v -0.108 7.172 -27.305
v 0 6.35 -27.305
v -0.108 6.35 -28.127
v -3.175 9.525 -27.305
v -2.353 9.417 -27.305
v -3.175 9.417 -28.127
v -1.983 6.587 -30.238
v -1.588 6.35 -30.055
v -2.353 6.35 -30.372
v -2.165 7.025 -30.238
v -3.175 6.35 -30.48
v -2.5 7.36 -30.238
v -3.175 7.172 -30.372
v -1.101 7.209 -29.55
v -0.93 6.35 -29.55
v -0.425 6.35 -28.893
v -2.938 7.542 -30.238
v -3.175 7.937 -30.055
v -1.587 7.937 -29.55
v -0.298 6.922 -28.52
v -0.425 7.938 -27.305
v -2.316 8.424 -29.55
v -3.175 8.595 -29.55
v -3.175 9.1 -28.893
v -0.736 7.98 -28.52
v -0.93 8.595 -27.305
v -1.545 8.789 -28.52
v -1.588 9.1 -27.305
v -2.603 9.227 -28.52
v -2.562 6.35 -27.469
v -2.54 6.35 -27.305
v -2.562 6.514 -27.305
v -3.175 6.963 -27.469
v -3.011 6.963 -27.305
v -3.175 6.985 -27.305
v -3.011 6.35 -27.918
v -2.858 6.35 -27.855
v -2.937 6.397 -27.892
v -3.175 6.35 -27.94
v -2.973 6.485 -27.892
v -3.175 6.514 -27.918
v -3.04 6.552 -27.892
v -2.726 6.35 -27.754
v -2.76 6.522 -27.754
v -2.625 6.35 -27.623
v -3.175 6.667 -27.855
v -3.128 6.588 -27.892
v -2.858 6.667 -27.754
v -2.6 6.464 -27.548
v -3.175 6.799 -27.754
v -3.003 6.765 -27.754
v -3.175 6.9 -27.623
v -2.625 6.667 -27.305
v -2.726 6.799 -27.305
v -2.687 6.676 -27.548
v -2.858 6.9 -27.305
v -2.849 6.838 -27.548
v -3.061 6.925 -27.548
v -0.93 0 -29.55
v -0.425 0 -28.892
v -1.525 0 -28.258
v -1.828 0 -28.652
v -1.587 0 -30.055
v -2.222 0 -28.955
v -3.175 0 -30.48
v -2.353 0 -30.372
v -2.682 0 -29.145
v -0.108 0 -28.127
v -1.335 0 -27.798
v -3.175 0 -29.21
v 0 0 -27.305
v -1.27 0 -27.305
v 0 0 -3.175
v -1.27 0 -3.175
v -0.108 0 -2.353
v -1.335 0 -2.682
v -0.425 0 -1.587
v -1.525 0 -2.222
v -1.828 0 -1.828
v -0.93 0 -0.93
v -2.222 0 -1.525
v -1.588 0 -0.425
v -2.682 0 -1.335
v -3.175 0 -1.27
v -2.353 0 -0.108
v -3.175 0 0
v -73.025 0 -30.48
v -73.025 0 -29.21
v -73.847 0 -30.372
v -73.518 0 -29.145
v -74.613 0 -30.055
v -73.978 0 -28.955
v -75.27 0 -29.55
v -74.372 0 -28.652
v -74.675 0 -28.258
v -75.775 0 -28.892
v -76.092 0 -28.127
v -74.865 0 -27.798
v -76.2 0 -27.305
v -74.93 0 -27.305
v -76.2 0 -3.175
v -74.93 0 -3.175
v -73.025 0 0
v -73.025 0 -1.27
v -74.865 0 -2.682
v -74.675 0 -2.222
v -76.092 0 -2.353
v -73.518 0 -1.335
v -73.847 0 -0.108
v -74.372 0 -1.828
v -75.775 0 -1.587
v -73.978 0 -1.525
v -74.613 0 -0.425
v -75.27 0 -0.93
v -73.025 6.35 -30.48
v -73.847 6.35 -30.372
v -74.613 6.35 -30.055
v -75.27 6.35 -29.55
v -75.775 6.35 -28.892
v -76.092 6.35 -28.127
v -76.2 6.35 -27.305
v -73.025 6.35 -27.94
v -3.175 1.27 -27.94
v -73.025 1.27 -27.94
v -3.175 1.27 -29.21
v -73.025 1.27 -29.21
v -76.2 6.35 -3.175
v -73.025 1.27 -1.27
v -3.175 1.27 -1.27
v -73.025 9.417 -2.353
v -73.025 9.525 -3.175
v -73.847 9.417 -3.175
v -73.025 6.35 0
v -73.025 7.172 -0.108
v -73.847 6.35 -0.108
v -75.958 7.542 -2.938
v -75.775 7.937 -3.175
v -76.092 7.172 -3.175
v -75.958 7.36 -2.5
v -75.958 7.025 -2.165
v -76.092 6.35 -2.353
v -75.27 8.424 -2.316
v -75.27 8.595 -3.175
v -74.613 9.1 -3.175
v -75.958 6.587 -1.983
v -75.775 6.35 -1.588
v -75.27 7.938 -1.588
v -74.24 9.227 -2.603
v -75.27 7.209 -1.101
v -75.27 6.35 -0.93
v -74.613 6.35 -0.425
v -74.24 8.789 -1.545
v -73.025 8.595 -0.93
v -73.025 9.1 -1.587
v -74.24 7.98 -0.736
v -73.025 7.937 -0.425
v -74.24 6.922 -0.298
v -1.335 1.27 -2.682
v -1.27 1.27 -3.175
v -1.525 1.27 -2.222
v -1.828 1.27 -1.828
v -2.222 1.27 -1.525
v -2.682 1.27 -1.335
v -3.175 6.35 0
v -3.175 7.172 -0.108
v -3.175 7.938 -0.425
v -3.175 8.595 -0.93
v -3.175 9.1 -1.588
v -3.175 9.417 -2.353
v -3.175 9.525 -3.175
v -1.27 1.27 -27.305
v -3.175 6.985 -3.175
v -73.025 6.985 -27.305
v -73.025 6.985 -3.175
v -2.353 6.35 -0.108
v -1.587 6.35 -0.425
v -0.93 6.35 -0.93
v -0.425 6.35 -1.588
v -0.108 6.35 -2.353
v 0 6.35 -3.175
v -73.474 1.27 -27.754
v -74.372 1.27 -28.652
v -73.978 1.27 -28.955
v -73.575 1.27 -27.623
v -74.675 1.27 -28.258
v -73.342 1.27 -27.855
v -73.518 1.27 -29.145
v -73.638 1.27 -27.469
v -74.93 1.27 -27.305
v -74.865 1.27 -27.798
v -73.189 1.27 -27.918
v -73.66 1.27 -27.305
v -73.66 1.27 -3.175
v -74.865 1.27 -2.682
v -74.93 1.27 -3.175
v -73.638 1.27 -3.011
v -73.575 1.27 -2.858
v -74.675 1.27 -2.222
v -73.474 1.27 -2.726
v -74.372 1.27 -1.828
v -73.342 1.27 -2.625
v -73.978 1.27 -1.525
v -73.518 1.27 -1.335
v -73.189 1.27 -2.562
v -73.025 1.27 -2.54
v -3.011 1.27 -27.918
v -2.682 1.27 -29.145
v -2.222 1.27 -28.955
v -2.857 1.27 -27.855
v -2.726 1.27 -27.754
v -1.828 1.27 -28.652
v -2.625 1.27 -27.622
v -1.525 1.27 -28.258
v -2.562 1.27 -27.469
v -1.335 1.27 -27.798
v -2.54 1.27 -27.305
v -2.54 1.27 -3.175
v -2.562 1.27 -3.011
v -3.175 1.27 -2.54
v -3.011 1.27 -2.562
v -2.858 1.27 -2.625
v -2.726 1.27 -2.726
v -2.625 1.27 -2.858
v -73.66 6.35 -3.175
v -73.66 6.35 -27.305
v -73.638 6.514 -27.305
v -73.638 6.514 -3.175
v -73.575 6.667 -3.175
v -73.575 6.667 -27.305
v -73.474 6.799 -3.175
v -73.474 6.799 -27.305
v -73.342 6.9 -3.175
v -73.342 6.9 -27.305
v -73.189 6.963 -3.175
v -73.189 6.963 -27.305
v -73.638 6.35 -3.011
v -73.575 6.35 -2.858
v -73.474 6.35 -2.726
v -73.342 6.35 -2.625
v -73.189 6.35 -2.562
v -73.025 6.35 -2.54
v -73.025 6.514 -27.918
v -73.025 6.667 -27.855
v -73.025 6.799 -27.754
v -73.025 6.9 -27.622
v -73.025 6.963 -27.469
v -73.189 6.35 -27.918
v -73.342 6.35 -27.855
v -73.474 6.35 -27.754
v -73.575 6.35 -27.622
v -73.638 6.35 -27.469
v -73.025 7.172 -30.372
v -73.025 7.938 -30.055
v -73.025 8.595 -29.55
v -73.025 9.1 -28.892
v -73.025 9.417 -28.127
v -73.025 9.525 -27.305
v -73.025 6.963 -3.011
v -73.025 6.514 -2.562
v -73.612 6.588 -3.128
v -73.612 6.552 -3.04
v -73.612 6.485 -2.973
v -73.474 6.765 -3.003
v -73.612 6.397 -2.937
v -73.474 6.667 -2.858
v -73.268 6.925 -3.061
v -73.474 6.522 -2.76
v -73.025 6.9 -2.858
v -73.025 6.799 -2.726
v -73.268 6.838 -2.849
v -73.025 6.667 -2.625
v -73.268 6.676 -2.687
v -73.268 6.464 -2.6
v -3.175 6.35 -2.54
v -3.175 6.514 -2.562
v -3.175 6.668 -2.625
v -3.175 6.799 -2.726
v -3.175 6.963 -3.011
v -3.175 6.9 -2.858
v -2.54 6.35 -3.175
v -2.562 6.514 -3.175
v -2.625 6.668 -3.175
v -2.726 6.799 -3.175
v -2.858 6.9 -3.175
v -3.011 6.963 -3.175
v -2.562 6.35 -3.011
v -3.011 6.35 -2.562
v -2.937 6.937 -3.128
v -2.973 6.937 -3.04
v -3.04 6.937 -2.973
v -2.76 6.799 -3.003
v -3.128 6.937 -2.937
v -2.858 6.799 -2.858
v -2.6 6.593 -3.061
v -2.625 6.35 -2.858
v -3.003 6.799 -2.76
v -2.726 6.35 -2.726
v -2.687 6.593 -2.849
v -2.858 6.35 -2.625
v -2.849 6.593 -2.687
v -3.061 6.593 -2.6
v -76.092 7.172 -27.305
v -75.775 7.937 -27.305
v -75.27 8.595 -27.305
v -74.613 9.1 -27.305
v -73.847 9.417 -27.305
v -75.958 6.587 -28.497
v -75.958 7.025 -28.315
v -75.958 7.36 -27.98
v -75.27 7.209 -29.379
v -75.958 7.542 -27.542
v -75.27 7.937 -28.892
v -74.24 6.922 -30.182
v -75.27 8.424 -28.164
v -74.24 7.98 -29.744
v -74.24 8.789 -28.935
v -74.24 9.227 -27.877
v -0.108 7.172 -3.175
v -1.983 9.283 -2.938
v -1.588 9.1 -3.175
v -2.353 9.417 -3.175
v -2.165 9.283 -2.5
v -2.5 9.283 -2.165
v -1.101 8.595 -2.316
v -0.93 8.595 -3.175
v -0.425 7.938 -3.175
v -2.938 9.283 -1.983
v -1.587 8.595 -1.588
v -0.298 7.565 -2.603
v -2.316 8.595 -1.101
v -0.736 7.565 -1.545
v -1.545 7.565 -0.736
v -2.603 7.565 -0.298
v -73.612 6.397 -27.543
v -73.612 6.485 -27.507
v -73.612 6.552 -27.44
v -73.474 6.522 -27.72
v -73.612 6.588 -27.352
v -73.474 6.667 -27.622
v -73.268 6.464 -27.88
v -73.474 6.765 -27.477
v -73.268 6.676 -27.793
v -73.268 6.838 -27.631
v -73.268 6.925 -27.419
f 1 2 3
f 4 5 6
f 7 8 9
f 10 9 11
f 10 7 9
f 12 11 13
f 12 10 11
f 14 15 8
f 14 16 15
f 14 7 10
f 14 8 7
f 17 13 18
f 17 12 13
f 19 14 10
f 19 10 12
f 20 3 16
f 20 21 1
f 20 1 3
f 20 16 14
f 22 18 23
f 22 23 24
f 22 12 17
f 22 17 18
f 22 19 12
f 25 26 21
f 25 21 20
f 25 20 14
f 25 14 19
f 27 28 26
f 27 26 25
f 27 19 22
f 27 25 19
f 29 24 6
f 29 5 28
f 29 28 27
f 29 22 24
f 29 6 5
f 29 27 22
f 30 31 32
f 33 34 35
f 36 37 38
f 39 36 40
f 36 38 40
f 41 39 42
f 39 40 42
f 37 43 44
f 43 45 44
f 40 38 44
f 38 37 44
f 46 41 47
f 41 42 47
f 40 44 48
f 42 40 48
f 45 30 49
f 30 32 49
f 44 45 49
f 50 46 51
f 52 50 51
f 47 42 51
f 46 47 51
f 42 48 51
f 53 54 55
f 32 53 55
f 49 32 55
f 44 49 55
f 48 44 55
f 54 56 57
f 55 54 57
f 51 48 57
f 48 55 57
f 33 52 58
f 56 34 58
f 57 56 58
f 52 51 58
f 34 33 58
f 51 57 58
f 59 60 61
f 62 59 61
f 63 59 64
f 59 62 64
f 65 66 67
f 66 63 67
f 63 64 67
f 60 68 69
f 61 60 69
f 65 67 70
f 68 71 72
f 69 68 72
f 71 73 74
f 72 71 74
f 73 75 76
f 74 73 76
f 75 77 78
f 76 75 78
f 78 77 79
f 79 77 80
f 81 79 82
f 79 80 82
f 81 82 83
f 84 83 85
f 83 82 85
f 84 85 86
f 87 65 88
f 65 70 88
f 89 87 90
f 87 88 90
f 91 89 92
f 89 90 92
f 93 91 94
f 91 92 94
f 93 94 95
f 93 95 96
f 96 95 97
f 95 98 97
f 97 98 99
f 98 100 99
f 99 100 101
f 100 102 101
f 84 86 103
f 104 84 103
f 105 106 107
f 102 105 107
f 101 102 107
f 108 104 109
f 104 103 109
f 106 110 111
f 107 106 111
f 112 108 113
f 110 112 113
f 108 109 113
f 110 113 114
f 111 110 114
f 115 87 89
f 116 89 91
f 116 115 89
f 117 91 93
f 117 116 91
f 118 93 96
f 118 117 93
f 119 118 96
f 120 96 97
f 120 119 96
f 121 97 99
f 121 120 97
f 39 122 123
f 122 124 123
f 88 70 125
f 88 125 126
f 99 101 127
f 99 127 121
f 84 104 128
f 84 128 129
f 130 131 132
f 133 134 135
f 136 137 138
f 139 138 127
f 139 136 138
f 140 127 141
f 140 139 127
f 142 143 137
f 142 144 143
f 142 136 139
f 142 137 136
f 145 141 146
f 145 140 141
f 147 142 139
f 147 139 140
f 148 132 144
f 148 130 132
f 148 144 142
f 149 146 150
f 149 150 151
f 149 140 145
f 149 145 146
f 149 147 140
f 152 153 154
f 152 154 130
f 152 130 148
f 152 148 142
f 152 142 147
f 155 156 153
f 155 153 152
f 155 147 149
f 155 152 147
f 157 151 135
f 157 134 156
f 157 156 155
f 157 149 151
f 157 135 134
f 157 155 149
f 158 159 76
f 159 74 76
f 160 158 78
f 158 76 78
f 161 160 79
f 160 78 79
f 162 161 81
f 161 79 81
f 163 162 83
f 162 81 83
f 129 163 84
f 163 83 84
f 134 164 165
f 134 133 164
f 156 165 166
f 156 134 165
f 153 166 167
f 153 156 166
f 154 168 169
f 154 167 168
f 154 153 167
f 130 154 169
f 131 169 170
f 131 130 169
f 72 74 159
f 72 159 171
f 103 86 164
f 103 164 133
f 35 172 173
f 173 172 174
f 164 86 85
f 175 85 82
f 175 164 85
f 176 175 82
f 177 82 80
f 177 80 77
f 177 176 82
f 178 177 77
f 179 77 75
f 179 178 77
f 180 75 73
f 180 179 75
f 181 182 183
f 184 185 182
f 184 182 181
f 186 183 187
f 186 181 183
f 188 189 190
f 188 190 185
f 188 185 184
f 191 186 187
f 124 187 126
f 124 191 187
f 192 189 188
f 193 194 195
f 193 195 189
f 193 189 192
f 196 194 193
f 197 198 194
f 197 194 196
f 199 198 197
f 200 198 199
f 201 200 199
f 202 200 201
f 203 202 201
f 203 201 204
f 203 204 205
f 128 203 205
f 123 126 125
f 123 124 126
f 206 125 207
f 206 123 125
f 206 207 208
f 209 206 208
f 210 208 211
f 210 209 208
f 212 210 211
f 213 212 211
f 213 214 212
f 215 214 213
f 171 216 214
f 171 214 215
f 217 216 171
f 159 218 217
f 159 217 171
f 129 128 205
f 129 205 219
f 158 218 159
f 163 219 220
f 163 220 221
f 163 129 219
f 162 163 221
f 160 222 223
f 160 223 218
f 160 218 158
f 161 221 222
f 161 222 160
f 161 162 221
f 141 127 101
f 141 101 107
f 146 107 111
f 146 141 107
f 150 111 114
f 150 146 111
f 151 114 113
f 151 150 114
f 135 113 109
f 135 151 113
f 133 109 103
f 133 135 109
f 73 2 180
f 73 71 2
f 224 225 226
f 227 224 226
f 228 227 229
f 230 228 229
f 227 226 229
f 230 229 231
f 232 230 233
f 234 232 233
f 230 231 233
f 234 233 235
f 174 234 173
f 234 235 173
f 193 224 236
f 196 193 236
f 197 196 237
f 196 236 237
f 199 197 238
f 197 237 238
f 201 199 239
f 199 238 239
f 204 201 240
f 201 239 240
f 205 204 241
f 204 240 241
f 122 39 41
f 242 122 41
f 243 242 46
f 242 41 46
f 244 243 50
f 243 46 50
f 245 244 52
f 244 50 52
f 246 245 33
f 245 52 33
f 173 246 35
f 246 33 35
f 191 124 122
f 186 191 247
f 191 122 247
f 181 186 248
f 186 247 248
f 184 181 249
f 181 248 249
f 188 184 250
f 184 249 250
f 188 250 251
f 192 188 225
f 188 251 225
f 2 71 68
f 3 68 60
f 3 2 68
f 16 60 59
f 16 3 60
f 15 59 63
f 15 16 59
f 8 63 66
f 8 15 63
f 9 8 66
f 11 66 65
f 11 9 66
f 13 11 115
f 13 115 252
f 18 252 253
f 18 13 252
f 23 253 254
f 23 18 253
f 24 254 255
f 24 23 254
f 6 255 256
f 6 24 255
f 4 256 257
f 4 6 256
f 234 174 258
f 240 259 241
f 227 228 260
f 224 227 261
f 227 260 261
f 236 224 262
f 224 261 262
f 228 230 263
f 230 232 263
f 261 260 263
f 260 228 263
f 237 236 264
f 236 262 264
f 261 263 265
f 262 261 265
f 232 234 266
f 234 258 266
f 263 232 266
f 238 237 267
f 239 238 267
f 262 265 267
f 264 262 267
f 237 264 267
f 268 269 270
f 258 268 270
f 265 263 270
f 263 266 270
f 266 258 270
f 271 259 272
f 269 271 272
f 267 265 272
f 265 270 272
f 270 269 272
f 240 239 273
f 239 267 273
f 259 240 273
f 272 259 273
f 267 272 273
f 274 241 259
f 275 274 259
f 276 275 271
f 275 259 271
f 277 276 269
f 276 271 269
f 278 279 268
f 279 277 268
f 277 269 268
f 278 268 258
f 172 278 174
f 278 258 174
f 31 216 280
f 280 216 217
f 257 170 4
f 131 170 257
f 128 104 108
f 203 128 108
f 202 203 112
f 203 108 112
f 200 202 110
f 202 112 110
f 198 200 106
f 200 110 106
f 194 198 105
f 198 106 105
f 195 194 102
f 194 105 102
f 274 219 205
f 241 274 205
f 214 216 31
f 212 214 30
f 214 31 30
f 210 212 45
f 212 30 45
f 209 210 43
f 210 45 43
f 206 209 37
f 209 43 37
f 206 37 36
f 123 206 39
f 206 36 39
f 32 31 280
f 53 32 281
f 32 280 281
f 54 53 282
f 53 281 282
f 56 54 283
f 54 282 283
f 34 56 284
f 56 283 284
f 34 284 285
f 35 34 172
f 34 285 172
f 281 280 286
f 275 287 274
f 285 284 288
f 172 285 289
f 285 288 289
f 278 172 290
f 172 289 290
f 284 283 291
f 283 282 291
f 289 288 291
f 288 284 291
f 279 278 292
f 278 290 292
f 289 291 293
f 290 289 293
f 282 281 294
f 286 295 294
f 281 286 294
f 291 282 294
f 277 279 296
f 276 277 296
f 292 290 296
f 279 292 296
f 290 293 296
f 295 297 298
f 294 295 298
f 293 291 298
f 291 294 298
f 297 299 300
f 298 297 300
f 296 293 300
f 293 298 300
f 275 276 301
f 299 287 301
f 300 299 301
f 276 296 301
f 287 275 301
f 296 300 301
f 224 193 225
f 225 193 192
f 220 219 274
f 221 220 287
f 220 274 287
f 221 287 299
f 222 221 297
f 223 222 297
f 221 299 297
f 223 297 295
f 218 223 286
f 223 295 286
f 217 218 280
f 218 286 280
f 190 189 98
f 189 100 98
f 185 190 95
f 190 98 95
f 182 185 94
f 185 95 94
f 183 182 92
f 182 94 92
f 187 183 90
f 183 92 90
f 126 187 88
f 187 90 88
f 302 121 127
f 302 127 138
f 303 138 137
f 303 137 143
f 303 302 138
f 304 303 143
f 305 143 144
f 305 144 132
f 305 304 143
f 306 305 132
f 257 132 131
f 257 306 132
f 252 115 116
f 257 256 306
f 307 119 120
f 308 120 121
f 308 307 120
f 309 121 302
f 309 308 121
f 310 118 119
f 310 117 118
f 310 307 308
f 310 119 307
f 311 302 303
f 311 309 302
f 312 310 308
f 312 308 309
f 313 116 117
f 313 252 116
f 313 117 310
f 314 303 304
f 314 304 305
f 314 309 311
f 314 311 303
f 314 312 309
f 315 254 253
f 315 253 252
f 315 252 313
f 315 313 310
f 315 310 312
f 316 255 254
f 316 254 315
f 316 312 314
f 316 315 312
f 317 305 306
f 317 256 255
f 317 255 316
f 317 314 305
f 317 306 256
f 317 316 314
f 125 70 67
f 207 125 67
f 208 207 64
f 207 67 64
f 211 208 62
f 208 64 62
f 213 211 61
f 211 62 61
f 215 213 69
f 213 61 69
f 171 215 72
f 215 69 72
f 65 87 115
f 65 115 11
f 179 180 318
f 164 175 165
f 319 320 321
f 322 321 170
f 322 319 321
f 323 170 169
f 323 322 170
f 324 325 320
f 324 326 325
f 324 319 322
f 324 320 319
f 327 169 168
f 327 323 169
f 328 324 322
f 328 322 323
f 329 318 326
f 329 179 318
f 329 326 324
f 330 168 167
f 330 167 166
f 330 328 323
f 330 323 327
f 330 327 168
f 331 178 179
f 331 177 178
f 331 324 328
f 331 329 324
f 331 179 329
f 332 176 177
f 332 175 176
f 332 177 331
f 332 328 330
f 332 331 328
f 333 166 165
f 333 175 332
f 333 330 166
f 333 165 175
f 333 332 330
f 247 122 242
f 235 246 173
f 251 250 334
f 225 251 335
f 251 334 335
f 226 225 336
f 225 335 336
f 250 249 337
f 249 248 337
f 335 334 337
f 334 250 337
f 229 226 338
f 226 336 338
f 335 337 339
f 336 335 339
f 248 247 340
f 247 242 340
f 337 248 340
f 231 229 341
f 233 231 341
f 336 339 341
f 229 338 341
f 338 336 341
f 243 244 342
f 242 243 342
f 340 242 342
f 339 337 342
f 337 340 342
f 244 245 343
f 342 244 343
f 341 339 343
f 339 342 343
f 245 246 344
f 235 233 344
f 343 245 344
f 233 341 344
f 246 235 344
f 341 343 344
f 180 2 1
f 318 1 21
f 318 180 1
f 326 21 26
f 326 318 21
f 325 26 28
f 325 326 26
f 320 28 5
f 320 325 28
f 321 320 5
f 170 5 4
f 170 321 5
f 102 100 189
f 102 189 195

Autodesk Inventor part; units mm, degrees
ref_plane "YZ Plane" through (0, 0, 0) normal (1, 0, 0) x (0, 1, 0)
ref_plane "XZ Plane" through (0, 0, 0) normal (0, 1, 0) x (-1, 0, 0)
ref_plane "XY Plane" through (0, 0, 0) normal (0, 0, 1) x (1, 0, 0)
sketch "Sketch1" plane through (0, 0, 0) normal (0, 1, 0) x (-1, 0, 0)
  line L0 (0, 0) -> (76.2, 0)
  line L1 (76.2, 0) -> (76.2, -30.48)
  line L2 (76.2, -30.48) -> (0, -30.48)
  line L3 (0, -30.48) -> (0, 0)
  dimension "d0" = 76.2
  dimension "d1" = 30.48
extrude "Extrusion1" add sketch "Sketch1" along normal blind 9.525
fillet "Fillet1" radius 3.175 8 edges at (0, 4.7625, 0) (0, 9.525, -15.24) (-38.1, 9.525, 0) (-38.1, 9.525, -30.48) (0, 4.7625, -30.48) (-76.2, 4.7625, 0) (-76.2, 9.525, -15.24) (-76.2, 4.7625, -30.48)
shell "Shell1" thickness 2.54 removed faces 1 at (-26.4583, 0, -20.32)
sketch "Sketch2" plane through (0, 0, 0) normal (0, -1, 0) x (1, 0, 0)
  line L0 (0, -27.305) -> (0, -3.175) projected
  arc A0 (-3.175, -30.48) -> (0, -27.305) centre (-3.175, -27.305) ccw projected
  line L1 (-73.025, -30.48) -> (-3.175, -30.48) projected
  arc A1 (0, -3.175) -> (-3.175, 0) centre (-3.175, -3.175) ccw projected
  line L2 (-3.175, 0) -> (-73.025, 0) projected
  arc A2 (-73.025, 0) -> (-76.2, -3.175) centre (-73.025, -3.175) ccw projected
  line L3 (-76.2, -3.175) -> (-76.2, -27.305) projected
  arc A3 (-76.2, -27.305) -> (-73.025, -30.48) centre (-73.025, -27.305) ccw projected
  arc A4 (-73.025, -1.27) -> (-74.93, -3.175) centre (-73.025, -3.175) ccw
  line L4 (-73.025, -1.27) -> (-3.175, -1.27)
  arc A5 (-1.27, -3.175) -> (-3.175, -1.27) centre (-3.175, -3.175) ccw
  line L5 (-1.27, -3.175) -> (-1.27, -27.305)
  arc A6 (-3.175, -29.21) -> (-1.27, -27.305) centre (-3.175, -27.305) ccw
  line L6 (-3.175, -29.21) -> (-73.025, -29.21)
  arc A7 (-74.93, -27.305) -> (-73.025, -29.21) centre (-73.025, -27.305) ccw
  line L7 (-74.93, -27.305) -> (-74.93, -3.175)
  point P0 (0, 0)
  dimension "d6" = 1.27
extrude "Extrusion2" cut sketch "Sketch2" against normal blind 1.27 contours L4 A5 L5 A6 L6 A7 L7 A4
properties part number "box_top"
